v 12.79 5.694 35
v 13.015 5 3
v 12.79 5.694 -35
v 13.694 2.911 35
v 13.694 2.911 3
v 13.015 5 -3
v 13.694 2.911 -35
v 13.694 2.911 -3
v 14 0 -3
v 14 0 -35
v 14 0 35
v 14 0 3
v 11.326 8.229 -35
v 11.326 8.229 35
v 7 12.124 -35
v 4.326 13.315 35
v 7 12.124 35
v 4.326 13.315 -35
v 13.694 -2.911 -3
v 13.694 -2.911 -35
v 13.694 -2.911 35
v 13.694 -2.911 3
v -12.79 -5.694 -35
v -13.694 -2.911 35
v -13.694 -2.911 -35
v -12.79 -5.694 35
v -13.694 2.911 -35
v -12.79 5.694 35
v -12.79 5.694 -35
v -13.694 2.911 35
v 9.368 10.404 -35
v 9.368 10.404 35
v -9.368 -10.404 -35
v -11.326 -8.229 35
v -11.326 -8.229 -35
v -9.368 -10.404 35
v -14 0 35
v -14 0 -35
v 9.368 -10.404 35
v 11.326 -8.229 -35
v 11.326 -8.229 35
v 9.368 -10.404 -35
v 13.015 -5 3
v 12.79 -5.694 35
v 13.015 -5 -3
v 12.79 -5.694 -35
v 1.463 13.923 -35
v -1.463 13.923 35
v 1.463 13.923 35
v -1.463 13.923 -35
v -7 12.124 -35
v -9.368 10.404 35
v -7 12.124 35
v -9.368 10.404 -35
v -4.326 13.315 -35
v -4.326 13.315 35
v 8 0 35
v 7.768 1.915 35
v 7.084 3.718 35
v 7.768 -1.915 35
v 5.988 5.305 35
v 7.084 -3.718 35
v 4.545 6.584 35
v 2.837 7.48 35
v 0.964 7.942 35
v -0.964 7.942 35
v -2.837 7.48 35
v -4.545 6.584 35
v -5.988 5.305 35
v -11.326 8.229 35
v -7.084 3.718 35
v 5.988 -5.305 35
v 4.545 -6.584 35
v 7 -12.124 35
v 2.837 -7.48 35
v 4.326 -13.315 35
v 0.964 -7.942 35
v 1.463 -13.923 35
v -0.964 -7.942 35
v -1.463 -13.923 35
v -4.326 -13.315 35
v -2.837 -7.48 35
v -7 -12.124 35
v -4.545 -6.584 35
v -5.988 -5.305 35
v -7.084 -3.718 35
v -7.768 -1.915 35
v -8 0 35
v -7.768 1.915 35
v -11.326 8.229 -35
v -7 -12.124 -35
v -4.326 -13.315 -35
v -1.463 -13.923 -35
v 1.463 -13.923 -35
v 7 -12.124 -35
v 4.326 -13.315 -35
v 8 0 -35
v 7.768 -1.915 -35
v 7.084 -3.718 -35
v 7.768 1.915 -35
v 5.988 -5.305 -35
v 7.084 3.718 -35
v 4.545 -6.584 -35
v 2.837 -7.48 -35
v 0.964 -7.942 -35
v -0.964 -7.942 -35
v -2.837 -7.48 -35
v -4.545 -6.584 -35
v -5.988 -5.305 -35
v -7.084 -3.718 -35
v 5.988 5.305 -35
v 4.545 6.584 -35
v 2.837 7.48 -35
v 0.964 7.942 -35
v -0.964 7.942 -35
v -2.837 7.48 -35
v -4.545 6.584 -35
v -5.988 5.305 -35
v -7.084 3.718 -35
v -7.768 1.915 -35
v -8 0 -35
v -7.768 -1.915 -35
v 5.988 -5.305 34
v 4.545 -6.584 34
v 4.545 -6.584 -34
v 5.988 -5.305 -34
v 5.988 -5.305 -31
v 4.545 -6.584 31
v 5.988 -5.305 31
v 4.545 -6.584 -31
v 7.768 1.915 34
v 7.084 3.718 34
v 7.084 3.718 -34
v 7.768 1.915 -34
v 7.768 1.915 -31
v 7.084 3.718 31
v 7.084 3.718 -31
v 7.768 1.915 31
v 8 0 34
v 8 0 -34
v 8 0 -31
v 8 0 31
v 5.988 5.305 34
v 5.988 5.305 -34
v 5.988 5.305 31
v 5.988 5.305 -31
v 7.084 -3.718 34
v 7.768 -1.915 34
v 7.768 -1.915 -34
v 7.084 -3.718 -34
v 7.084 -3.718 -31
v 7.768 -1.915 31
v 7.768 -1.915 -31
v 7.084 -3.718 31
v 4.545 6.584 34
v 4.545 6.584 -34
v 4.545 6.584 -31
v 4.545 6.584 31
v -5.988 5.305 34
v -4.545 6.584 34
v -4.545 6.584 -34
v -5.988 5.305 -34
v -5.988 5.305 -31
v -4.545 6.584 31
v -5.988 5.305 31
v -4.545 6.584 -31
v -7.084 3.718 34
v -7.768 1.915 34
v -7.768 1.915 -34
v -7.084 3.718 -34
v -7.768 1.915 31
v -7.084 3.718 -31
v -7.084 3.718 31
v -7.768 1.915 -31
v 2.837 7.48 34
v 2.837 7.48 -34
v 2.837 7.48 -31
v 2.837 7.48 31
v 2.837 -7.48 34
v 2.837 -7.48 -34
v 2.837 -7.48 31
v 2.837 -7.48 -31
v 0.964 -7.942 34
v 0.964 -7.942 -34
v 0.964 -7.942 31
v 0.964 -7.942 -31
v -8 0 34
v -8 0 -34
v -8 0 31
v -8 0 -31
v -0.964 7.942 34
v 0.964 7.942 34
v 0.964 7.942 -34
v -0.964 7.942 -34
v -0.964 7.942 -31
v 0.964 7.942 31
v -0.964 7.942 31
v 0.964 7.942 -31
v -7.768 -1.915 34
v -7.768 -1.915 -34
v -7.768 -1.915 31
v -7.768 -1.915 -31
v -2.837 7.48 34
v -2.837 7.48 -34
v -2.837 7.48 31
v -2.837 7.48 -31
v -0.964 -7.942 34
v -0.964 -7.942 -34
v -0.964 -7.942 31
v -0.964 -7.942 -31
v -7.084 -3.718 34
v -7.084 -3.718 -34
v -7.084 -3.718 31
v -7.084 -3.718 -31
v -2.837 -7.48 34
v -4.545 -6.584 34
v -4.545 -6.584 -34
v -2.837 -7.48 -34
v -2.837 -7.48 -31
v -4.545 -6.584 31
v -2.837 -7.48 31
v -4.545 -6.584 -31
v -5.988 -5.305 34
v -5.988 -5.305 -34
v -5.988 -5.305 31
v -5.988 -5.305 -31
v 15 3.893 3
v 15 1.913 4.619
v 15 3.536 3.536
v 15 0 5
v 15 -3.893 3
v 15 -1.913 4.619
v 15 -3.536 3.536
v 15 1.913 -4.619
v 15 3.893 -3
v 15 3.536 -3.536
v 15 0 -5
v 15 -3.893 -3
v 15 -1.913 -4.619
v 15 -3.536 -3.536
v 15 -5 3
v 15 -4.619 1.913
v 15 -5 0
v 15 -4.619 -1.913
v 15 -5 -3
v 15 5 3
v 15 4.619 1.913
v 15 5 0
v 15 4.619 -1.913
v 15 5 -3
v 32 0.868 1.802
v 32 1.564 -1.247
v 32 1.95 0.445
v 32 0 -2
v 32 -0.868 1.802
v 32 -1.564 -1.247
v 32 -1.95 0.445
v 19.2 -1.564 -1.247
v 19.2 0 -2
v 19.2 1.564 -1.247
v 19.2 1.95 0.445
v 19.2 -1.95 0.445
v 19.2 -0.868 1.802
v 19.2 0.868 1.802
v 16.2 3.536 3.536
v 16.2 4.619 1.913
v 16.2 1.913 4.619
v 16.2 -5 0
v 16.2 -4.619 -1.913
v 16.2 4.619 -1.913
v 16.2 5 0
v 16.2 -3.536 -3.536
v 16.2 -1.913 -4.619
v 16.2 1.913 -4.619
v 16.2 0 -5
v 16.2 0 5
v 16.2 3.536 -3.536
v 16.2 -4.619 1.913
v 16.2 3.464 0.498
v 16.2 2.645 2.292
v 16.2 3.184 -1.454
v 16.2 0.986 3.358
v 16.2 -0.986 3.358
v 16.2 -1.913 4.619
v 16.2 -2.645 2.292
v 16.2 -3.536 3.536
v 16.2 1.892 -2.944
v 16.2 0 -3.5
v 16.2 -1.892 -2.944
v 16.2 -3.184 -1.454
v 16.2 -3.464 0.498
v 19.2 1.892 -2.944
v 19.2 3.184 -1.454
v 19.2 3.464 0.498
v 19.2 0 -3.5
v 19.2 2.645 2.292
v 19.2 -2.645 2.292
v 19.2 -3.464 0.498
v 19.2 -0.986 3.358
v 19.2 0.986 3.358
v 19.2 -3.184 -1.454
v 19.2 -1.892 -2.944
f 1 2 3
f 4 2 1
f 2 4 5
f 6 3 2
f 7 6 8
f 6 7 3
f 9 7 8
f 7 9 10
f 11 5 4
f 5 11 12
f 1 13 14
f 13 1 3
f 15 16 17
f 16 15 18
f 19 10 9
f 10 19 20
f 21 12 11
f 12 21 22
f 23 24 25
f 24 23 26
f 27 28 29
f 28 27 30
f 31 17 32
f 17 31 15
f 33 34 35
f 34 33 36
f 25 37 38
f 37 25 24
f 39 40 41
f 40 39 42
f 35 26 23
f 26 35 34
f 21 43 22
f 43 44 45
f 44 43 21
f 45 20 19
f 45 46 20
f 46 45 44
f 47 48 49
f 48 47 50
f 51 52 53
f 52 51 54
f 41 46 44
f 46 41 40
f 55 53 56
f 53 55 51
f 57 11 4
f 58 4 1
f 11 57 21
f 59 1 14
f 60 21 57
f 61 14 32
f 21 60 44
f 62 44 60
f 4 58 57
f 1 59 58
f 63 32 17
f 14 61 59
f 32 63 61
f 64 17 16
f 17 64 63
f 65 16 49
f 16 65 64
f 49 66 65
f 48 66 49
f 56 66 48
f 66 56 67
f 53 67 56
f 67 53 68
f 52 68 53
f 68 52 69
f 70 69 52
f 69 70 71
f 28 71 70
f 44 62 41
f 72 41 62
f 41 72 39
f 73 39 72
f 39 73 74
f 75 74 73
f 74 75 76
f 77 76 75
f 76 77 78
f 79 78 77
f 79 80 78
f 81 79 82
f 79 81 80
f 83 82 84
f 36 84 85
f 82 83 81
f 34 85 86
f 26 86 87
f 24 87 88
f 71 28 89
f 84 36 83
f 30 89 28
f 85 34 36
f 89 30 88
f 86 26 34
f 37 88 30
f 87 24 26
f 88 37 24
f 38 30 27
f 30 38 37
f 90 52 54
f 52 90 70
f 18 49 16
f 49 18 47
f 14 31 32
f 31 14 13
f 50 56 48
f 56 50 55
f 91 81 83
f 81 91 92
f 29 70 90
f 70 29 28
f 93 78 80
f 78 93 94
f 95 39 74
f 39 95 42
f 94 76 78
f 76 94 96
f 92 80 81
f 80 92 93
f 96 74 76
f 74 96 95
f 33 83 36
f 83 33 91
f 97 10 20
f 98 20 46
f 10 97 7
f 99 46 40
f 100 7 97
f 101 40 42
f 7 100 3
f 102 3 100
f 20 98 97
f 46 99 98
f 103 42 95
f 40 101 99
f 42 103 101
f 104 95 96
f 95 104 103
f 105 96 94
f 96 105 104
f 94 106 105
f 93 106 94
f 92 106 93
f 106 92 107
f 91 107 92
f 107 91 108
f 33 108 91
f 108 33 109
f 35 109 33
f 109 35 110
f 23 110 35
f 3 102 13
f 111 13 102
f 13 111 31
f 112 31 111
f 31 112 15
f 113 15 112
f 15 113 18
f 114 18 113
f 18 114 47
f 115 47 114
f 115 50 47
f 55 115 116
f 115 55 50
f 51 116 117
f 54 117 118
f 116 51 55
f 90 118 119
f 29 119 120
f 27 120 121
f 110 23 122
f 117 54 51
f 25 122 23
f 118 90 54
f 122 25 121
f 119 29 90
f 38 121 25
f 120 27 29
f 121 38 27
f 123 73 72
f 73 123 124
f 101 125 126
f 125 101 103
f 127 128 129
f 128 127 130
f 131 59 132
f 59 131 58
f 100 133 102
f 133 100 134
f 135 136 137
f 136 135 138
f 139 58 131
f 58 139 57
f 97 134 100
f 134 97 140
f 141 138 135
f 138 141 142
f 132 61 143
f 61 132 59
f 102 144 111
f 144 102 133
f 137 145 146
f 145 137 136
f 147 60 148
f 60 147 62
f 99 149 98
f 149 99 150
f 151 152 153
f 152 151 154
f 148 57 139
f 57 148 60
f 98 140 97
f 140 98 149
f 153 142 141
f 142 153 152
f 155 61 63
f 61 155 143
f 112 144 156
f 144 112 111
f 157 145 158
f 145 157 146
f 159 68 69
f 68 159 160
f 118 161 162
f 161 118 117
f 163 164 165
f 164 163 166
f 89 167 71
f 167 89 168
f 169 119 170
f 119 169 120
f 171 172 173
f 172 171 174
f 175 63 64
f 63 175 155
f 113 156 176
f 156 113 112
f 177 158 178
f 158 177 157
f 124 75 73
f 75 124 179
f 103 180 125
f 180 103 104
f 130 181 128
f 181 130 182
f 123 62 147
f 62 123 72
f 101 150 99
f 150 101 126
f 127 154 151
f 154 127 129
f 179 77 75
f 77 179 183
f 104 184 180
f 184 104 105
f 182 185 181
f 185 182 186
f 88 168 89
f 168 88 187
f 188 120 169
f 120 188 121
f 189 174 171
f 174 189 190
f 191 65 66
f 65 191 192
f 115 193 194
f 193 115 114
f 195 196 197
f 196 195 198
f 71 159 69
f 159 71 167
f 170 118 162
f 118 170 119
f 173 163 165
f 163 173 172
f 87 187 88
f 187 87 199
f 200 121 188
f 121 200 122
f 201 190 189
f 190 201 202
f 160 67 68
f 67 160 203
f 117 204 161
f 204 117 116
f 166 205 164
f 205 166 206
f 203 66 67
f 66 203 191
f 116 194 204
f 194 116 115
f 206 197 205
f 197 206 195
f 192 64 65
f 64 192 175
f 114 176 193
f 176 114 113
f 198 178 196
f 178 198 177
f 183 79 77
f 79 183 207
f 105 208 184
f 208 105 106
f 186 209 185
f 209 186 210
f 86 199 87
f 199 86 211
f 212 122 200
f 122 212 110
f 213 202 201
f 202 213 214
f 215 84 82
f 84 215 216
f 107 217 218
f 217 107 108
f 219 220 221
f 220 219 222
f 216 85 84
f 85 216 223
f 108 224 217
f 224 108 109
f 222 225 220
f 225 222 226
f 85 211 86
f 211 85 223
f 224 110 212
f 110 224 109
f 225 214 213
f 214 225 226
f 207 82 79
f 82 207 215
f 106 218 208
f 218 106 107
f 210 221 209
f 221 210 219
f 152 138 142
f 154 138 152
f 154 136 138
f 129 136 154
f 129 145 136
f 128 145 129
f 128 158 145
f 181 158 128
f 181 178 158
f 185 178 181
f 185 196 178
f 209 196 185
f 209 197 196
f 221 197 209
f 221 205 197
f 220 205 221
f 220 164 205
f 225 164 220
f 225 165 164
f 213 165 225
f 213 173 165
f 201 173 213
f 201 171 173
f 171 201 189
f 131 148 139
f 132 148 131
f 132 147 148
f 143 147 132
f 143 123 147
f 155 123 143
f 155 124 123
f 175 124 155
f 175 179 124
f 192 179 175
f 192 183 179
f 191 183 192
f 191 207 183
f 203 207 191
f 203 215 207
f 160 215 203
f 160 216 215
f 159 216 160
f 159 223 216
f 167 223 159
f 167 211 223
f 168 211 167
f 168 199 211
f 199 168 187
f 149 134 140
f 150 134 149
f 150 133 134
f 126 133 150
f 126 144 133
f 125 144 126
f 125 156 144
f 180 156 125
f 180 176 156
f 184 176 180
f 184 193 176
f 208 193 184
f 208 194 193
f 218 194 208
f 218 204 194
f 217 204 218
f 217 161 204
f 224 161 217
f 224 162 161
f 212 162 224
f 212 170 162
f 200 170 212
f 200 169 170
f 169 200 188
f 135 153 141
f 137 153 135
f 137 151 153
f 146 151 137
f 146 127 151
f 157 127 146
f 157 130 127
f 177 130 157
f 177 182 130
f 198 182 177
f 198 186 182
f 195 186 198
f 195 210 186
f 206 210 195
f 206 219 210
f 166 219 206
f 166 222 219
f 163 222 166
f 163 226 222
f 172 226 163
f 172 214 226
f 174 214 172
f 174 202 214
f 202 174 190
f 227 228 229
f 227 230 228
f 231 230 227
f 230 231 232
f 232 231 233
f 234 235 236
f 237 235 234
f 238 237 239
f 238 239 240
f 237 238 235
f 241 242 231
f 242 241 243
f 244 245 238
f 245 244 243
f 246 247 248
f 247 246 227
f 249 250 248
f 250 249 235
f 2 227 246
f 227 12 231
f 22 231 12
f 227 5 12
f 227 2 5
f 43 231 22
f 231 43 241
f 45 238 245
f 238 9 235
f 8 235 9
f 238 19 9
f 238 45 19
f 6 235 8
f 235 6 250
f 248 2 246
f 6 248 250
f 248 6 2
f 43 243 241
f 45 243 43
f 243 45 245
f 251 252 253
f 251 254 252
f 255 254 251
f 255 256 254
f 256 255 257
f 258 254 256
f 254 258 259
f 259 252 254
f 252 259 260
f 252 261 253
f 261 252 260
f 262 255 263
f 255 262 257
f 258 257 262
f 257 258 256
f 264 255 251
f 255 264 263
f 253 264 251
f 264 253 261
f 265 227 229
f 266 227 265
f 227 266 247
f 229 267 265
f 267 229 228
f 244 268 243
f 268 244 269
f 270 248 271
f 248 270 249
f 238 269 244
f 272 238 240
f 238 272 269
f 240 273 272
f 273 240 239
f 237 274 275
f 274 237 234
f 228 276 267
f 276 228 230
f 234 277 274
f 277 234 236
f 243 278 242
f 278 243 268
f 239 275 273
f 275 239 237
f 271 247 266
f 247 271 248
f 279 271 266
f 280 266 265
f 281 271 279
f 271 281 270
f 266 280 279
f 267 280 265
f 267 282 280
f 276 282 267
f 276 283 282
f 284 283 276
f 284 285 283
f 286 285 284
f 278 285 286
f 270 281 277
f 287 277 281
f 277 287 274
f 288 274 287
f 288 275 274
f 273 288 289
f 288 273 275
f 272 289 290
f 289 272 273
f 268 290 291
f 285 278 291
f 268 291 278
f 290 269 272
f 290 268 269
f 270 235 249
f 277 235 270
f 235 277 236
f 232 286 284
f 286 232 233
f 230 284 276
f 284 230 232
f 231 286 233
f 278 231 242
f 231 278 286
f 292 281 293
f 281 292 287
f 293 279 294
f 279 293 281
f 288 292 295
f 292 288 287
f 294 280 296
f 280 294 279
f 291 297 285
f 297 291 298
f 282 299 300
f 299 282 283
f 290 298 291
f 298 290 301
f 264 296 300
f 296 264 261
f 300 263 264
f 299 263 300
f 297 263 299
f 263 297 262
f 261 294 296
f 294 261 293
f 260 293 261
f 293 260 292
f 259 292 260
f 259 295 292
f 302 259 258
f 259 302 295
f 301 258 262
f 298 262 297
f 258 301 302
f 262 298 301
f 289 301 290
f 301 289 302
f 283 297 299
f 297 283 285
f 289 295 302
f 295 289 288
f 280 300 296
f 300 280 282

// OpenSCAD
// Parameters
bore_diameter_mm = 16; //[8:32:0.1]
outer_diameter_mm = 28; //[14:56:0.1]
length_mm = 70; //[35:140:0.5]
casing_wall_thickness_mm = 6; //[3:12:0.1]
seal_clearance_mm = 0.2; //[0.05:0.6:0.05]
overlap_mm = 1; //[0.5:2:0.1]
seal_lip_length_mm = 3; //[1.5:6:0.1]
seal_lip_radial_thickness_mm = 1.2; //[0.6:2.5:0.1]
screw_shank_diameter_mm = 4; //[2:8:0.1]
screw_length_mm = 18; //[8:40:0.5]
screw_head_diameter_mm = 7; //[4:14:0.1]
screw_head_height_mm = 3; //[1.5:6:0.1]
washer_outer_diameter_mm = 10; //[6:20:0.1]
washer_thickness_mm = 1.2; //[0.6:3:0.1]
screw_attachment_flat_width_mm = 10; //[6:20:0.1]
screw_attachment_flat_height_mm = 6; //[3:12:0.1]
screw_attachment_flat_thickness_mm = 2; //[1:5:0.1]

// Linear Bearing - complete geometry
module linear_bearing() {
  color([0.85, 0.85, 0.8]) {
    // Outer casing
    difference() {
      cylinder(h=length_mm, r=outer_diameter_mm/2, center=true);
      // Through bore
      cylinder(h=length_mm + 2*overlap_mm, r=bore_diameter_mm/2, center=true);
    }
    // End seal lips
    union() {
      translate([0, 0, length_mm/2 - seal_lip_length_mm/2 - overlap_mm])
        cylinder(h=seal_lip_length_mm, r=bore_diameter_mm/2 + seal_clearance_mm + seal_lip_radial_thickness_mm, center=true);
      translate([0, 0, -length_mm/2 + seal_lip_length_mm/2 + overlap_mm])
        cylinder(h=seal_lip_length_mm, r=bore_diameter_mm/2 + seal_clearance_mm + seal_lip_radial_thickness_mm, center=true);
    }
  }
}

// Screw and Washer - complete geometry
module screw_and_washer() {
  color("DimGray") {
    // Screw attachment pad
    translate([outer_diameter_mm/2 + screw_attachment_flat_thickness_mm/2 - overlap_mm, 0, 0])
      cube([screw_attachment_flat_thickness_mm, screw_attachment_flat_width_mm, screw_attachment_flat_height_mm], center=true);
    // Screw shank
    translate([outer_diameter_mm/2 + screw_attachment_flat_thickness_mm + screw_length_mm/2 - 2*overlap_mm, 0, 0])
      rotate([0, 90, 0])
      cylinder(h=screw_length_mm, r=screw_shank_diameter_mm/2, center=true);
    // Washer
    translate([outer_diameter_mm/2 + screw_attachment_flat_thickness_mm - overlap_mm + washer_thickness_mm/2, 0, 0])
      rotate([0, 90, 0])
      cylinder(h=washer_thickness_mm, r=washer_outer_diameter_mm/2, center=true);
    // Screw head
    translate([outer_diameter_mm/2 + screw_attachment_flat_thickness_mm - overlap_mm + washer_thickness_mm + screw_head_height_mm/2, 0, 0])
      rotate([0, 90, 0])
      cylinder(h=screw_head_height_mm, r=screw_head_diameter_mm/2, center=true);
  }
}

// Assembly
module assembly() {
  linear_bearing();
  screw_and_washer();
}

assembly();
